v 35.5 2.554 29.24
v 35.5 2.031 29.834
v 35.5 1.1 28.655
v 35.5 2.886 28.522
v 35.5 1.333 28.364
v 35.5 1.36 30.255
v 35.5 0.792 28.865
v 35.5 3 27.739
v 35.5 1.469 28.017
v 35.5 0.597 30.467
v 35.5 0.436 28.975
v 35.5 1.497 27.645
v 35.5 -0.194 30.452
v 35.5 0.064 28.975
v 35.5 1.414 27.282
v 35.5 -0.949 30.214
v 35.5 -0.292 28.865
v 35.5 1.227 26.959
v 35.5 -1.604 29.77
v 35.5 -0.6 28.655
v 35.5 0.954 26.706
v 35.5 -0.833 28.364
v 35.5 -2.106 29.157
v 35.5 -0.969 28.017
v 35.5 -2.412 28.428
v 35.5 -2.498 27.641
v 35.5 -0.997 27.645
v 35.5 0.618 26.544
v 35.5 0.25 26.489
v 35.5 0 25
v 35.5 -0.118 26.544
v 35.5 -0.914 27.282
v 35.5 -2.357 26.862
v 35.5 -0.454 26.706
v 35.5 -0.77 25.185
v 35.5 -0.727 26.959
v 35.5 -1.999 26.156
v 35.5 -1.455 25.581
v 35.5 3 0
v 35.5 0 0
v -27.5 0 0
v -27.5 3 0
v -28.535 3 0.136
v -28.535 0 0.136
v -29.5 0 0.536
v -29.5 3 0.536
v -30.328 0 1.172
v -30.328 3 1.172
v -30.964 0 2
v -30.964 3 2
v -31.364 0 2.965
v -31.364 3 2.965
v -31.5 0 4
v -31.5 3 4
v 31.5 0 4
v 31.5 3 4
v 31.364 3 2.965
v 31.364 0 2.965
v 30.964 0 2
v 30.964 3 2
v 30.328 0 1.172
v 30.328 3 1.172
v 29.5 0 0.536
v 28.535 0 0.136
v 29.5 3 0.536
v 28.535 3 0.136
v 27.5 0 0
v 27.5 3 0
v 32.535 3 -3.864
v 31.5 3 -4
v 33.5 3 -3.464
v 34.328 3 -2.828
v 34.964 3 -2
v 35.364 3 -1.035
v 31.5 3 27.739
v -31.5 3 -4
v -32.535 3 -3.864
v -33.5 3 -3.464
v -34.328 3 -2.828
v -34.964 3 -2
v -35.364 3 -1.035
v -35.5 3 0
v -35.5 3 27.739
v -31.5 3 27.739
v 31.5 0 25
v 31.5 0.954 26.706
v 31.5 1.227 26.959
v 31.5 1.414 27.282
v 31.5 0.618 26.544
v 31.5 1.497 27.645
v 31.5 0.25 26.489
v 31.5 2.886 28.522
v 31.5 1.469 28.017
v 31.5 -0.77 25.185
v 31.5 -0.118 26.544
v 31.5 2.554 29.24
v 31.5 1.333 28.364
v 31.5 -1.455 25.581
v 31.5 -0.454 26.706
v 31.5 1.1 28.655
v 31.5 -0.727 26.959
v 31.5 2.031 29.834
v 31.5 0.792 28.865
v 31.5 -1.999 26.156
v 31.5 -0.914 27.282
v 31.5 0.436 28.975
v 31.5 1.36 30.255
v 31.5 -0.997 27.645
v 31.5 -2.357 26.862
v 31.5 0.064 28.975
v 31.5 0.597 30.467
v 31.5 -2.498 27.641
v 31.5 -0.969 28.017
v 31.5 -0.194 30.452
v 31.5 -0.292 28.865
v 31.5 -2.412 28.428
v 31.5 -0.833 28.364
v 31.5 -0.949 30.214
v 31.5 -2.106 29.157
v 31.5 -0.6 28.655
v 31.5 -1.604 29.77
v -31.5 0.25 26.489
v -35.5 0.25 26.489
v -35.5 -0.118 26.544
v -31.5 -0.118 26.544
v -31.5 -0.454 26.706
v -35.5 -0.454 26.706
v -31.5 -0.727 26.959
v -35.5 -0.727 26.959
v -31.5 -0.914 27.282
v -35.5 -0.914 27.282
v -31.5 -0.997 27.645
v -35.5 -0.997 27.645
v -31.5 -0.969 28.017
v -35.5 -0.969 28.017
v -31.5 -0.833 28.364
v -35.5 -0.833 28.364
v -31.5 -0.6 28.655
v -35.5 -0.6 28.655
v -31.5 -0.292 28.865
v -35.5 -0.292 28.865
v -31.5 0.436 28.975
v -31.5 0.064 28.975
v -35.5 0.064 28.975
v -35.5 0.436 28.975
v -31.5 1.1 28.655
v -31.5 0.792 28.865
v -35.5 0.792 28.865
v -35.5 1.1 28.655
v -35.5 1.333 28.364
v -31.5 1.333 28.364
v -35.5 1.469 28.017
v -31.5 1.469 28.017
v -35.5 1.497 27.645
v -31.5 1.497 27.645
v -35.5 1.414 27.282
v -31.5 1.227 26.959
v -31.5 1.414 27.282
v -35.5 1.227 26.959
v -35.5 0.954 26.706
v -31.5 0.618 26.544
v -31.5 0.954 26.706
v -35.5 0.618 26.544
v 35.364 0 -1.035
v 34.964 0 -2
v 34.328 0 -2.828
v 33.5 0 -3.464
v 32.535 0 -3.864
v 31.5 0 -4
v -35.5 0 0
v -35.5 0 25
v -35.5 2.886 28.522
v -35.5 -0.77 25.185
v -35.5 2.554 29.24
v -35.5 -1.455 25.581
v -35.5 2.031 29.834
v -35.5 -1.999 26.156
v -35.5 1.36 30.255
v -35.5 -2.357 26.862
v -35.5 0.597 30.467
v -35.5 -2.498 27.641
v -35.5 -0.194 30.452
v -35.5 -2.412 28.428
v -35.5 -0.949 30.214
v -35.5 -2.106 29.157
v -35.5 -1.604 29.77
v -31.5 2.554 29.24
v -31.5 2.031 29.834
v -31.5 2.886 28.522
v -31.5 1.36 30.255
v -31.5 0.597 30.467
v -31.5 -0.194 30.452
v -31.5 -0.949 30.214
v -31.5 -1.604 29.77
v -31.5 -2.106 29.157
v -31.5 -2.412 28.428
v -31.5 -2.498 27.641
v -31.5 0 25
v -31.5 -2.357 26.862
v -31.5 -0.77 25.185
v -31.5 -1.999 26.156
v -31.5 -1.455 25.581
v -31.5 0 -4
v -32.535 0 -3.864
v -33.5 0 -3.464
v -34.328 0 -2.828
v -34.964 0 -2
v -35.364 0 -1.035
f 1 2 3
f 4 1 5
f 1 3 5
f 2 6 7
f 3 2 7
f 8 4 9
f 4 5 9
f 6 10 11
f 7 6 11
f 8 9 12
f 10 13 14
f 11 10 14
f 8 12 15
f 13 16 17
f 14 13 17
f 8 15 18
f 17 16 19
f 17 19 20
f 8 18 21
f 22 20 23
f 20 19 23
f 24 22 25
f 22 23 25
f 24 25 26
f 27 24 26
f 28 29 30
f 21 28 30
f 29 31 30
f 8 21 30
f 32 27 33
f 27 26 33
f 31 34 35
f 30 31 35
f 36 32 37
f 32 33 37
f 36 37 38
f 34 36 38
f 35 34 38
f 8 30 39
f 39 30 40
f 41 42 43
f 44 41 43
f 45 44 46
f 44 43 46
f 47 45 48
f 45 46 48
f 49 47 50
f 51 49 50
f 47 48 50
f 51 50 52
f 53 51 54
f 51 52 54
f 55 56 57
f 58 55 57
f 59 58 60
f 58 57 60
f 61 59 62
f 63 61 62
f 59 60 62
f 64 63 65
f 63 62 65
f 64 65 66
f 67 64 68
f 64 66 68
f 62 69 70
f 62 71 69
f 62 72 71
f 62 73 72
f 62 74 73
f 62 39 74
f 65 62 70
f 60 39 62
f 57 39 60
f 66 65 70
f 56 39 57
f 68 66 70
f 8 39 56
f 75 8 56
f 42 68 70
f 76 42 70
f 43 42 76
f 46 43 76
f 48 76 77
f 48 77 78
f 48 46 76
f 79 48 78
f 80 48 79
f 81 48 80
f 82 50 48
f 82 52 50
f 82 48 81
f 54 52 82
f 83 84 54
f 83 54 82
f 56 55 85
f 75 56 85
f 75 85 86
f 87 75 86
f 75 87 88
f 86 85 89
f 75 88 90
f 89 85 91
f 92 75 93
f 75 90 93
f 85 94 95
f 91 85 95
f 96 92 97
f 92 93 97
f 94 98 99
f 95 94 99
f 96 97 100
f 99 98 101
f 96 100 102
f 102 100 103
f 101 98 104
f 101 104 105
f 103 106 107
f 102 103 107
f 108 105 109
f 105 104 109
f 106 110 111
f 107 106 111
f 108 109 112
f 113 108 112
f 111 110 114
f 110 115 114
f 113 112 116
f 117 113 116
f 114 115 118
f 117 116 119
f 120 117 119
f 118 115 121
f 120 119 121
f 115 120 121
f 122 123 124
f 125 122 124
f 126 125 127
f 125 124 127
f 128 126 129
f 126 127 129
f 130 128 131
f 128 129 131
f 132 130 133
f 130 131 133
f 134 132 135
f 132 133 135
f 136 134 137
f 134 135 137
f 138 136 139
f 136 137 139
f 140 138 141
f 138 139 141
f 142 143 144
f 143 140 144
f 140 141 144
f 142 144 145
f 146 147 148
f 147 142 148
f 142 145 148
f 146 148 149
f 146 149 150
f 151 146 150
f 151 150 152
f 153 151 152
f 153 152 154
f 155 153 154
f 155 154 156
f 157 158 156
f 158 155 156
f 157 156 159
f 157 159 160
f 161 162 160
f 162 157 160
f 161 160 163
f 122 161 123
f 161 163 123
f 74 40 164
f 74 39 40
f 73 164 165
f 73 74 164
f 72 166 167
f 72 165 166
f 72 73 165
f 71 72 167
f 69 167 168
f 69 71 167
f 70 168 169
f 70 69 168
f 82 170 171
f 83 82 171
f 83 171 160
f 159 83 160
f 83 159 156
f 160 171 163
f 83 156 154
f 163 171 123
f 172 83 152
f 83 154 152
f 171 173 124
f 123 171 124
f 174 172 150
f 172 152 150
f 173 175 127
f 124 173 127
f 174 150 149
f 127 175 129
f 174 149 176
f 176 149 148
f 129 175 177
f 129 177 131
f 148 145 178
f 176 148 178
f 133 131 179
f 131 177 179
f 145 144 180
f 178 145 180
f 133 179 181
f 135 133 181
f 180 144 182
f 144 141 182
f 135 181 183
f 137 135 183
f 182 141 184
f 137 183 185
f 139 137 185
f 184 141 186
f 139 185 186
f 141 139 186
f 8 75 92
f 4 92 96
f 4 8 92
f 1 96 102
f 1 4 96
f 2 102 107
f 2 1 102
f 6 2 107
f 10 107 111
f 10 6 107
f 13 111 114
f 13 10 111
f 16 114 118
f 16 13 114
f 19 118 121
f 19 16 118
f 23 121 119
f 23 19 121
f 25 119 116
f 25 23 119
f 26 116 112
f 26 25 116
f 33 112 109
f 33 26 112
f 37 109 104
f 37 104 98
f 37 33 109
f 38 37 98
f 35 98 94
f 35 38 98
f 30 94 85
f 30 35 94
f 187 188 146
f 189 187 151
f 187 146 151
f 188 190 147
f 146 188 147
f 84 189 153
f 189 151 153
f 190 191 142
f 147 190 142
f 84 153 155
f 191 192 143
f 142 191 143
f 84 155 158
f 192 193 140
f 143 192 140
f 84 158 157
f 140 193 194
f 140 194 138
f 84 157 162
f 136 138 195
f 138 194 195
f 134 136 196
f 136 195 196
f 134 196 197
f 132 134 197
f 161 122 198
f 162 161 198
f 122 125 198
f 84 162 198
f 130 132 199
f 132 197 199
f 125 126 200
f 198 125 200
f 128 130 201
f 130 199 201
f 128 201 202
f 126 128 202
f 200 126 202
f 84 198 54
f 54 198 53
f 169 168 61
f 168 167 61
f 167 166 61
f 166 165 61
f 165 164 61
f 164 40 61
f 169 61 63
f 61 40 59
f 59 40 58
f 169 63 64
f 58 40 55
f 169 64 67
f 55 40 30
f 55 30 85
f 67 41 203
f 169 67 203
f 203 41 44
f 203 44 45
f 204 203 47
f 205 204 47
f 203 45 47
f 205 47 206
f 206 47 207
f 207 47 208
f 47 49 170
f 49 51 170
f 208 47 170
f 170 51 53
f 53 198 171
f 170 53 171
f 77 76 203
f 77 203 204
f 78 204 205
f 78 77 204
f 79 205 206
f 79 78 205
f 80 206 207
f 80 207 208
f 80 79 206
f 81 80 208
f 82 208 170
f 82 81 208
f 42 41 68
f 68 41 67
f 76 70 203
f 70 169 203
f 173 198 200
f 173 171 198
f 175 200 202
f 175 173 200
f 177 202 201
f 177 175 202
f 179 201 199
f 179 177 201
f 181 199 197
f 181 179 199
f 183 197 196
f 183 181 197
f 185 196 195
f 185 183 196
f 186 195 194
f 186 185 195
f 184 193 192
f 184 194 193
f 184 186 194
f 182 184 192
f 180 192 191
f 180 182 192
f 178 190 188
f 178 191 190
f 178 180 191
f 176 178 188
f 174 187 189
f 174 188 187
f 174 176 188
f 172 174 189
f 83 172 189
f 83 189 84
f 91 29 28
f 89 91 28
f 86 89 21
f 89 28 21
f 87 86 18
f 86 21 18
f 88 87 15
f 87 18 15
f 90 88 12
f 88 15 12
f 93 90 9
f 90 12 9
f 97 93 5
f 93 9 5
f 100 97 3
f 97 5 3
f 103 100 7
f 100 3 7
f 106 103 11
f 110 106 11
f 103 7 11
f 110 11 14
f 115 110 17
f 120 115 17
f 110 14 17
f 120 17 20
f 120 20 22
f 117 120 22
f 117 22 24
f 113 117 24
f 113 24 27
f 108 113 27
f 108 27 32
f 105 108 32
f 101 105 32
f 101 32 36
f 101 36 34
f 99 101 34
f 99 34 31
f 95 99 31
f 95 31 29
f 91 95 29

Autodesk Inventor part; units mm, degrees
ref_plane "XZ Plane" through (0, 0, 0) normal (0, 1, 0) x (-1, 0, 0)
ref_plane "XY Plane" through (0, 0, 0) normal (0, 0, 1) x (1, 0, 0)
sketch "Sketch2" plane through (0, 0, 0) normal (0, 1, 0) x (-1, 0, 0)
  line L0 (35.5, -4) -> (35.5, 25)
  line L1 (35.5, 25) -> (31.5, 25)
  line L2 (31.5, 25) -> (31.5, 0)
  line L3 (31.5, 0) -> (-31.5, 0)
  line L4 (-31.5, 0) -> (-31.5, 25)
  line L5 (-31.5, 25) -> (-35.5, 25)
  line L6 (-35.5, 25) -> (-35.5, -4)
  line L7 (-35.5, -4) -> (35.5, -4)
  line L8 (0, -9.8) -> (0, 30.8) construction
  line L9 (-49.7, 0) -> (49.7, 0) construction
  point P0 (0, 0)
  dimension "d0" = 4
  dimension "d1" = 25
  dimension "d2" = 71
  dimension "d3" = 4
extrude "Extrusion1" add sketch "Sketch2" along normal blind 3
sketch "Sketch3" plane through (35.5, 0, 25) normal (1, 0, 0) x (0, 0, -1)
  line L0 (0, 0) -> (0, 3) construction
  line L1 (0, 0) -> (0, 3) construction
  line L2 (0, 0.25) -> (-2.7386, 0.25) construction
  circle A0 centre (-2.7386, 0.25) radius 1.25
  circle A1 centre (-2.7386, 0.25) radius 2.75
  line L3 (0, 0) -> (29, 0) construction
  line L4 (0, 3) -> (29, 3) construction
  line L5 (29, 3) -> (0, 3) construction
  line L6 (-2.7386, 3) -> (0, 3) construction
  line L7 (-2.7386, 3) -> (-2.7386, 0.25) construction
  line L8 (-2.7386, 3) -> (0, 3)
  line L9 (0, 0) -> (0, 3)
  point P0 (25, 0)
  dimension "d6" = 2.5
  dimension "d7" = 1.5
extrude "Extrusion2" add sketch "Sketch3" against normal up to surface (4 mm away)
mirror "Mirror1" about plane through (0, 0, 0) normal (1, 0, 0) of "Extrusion2"
fillet "Fillet1" radius 4 4 edges at (-35.5, 1.5, -4) (-31.5, 1.5, 0) (31.5, 1.5, 0) (35.5, 1.5, -4)
equation "\"d3\" = d0"
properties part number "back_support"
